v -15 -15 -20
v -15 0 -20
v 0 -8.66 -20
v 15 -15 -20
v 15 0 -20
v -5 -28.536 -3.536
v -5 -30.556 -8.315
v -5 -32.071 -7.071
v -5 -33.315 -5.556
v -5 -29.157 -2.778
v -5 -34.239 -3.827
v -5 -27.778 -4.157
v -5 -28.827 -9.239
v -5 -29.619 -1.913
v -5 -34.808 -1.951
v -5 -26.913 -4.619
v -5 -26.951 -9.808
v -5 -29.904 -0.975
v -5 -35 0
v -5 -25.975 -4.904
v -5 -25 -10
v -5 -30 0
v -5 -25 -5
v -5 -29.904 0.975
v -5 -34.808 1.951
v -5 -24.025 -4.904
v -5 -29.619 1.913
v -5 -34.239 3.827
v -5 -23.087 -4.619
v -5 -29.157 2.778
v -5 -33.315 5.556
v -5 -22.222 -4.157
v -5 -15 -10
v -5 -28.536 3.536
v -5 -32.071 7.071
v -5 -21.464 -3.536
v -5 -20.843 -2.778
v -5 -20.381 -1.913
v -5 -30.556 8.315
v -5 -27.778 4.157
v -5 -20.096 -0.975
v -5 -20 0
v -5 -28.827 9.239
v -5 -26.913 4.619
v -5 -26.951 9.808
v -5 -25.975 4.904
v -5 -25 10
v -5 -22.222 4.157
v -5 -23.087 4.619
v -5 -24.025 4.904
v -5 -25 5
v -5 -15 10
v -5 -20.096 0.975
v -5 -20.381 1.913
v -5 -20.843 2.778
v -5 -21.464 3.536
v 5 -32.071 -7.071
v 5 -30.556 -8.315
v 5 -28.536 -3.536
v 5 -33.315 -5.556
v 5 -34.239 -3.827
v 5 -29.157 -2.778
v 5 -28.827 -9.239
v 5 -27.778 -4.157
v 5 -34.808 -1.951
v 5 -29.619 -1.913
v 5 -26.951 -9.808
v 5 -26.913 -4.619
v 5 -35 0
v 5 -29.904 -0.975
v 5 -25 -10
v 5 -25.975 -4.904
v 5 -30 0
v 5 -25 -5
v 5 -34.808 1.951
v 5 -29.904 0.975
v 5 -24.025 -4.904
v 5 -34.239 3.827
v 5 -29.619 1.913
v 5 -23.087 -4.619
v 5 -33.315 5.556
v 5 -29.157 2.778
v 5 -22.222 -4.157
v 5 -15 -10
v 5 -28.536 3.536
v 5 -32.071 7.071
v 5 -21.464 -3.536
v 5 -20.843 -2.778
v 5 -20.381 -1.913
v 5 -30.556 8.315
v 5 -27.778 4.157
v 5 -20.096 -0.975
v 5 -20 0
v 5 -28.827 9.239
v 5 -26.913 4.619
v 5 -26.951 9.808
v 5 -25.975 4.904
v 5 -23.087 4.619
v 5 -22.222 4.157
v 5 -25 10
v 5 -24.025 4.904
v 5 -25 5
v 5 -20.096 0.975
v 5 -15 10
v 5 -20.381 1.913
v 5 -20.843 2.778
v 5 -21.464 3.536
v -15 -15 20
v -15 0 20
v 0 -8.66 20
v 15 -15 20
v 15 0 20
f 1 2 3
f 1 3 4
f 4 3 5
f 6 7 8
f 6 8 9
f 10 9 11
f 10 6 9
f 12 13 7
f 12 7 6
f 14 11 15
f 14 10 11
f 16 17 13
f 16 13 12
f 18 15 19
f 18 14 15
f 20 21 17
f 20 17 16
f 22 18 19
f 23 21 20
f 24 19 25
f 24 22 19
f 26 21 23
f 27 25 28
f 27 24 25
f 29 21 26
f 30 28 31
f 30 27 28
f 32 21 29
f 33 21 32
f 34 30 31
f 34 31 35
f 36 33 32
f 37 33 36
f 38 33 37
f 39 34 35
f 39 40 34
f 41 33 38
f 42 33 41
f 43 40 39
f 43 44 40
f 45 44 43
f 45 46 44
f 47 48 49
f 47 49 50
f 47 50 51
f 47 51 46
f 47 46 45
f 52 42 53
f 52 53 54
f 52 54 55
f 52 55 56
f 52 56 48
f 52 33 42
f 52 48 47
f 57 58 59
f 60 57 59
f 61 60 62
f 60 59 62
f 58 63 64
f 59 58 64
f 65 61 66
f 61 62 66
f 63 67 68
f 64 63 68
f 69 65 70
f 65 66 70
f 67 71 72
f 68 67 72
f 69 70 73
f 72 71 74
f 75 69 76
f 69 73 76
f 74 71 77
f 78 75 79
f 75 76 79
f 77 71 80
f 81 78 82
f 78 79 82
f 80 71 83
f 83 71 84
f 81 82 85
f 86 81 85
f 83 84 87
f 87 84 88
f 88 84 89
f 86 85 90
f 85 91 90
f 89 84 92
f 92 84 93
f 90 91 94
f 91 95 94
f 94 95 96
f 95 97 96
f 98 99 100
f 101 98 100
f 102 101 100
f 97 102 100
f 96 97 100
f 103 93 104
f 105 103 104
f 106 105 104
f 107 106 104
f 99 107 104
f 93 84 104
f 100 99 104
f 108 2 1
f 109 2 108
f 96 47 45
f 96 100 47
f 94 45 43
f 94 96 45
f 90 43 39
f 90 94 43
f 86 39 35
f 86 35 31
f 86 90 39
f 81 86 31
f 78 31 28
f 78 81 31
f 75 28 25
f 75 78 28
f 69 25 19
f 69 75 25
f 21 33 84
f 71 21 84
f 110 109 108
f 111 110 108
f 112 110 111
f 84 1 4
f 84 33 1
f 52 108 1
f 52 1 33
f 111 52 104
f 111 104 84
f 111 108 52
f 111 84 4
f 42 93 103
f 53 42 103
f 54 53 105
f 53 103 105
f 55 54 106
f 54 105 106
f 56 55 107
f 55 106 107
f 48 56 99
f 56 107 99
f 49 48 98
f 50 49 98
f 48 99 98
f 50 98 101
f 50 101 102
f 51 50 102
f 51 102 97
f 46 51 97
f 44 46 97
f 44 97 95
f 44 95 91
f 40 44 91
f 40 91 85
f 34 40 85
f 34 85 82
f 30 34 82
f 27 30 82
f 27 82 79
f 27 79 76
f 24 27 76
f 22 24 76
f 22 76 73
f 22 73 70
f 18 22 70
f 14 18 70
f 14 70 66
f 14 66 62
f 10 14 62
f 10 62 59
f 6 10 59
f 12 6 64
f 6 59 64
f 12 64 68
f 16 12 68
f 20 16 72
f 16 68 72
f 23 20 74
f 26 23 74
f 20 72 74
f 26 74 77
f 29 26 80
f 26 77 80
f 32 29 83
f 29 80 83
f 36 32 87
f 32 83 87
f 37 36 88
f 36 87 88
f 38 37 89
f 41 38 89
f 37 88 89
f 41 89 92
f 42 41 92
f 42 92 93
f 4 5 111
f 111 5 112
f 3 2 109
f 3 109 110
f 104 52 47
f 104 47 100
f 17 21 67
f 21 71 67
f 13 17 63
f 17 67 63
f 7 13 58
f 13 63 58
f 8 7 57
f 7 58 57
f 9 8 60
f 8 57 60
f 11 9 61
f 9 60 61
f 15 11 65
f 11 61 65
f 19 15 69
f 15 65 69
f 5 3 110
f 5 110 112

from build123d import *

# Parameters (mm, degrees)
F0_W     = 30
F0_H     = 40
F1_DEPTH = 15
F2_W     = 10
F2_H     = 20
F3_DEPTH = 20
F4_R     = 5
F5_DEPTH = 20.001
F6_R     = 9.99999
F8_DEPTH = 40.001


# Not quite as in the source:
# - a fillet or chamfer is up to 0.001 mm smaller than in the source, because OpenCascade refuses the exact size


with BuildPart() as f1:
    # F0 (on Front) → F1 (new body)
    with BuildSketch(Plane.XZ):
        Rectangle(F0_W, F0_H)
    extrude(amount=F1_DEPTH)

    # F2 (on face) → F3 (join)
    with BuildSketch(Plane.XZ.offset(15)):
        Rectangle(F2_W, F2_H)
    extrude(amount=F3_DEPTH)

    # F4 (on face) → F5 (cut, through all)
    with BuildSketch(Plane.YZ.offset(5)):
        with Locations((-25, 0)):
            Circle(F4_R)
    extrude(amount=-F5_DEPTH, mode=Mode.SUBTRACT)

    # F6 (radius 10 in the source; OpenCascade refuses exactly that, so slightly less here)
    f6_edges = [f1.edges().sort_by_distance(p)[0] for p in [
        (0, -35, 10),
        (0, -35, -10),
    ]]
    fillet(f6_edges, radius=F6_R)

    # F7 (on face) → F8 (cut, through all)
    with BuildSketch(Plane.XY.offset(20)):
        Polygon((15, 0), (-15, 0), (0, -8.6602540378), align=None)
    extrude(amount=-F8_DEPTH, mode=Mode.SUBTRACT)


solid = f1.part
